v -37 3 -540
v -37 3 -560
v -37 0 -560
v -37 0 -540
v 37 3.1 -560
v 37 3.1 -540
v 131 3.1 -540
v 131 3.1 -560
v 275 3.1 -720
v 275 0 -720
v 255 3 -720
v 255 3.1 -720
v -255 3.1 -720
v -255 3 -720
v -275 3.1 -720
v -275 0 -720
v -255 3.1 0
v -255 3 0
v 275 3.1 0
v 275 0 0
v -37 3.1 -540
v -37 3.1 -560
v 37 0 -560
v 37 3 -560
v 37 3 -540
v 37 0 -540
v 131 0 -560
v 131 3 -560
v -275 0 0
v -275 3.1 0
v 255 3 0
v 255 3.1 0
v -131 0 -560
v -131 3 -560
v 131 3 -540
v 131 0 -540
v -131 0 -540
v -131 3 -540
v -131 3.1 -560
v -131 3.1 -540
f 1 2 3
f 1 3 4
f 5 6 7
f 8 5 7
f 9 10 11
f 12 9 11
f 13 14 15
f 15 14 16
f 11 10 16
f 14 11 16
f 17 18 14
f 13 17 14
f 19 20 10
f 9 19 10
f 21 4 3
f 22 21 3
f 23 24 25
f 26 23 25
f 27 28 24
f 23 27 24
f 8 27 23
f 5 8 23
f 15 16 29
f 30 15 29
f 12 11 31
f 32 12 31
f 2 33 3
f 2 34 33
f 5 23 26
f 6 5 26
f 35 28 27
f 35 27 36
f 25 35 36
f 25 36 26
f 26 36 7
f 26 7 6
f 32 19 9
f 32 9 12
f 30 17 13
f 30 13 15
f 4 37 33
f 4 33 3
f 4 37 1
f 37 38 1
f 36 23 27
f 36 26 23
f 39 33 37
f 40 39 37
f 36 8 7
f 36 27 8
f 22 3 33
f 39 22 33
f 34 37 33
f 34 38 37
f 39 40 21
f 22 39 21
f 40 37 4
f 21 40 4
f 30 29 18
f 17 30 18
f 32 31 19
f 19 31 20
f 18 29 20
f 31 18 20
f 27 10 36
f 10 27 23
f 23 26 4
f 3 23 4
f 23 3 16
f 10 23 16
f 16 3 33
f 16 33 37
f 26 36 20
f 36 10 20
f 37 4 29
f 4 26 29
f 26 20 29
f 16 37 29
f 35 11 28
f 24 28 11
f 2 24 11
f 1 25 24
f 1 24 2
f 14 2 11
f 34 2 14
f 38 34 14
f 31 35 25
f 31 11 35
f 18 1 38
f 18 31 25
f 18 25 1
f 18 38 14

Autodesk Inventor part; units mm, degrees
ref_plane "YZ Plane" through (0, 0, 0) normal (1, 0, 0) x (0, 1, 0)
ref_plane "XZ Plane" through (0, 0, 0) normal (0, 1, 0) x (-1, 0, 0)
ref_plane "XY Plane" through (0, 0, 0) normal (0, 0, 1) x (1, 0, 0)
sketch "Sketch1" plane through (0, 0, 0) normal (0, 1, 0) x (-1, 0, 0)
  line L0 (275, 0) -> (-275, 0)
  line L1 (-275, 0) -> (-275, -720)
  line L2 (-275, -720) -> (275, -720)
  line L3 (275, -720) -> (275, 0)
  line L4 (255, 0) -> (255, -720)
  line L5 (-255, -720) -> (-255, 0)
  point P0 (0, 0)
  point P1 (0, 0)
  dimension "d0" = 550
  dimension "d1" = 720
  dimension "d4" = 20
  dimension "d5" = 20
extrude "Extrusion1" add sketch "Sketch1" along normal blind 3
extrude "Extrusion2" add sketch "Sketch1" along normal blind 3.1 contours L3 L2 L4 L0 | L5 L2 L1 L0
sketch "Sketch2" plane through (0, 3, 0) normal (0, 1, 0) x (1, 0, 0)
  line L0 (-275, 0) -> (275, 0) projected
  line L1 (-275, 0) -> (-275, 550)
  line L2 (-275, 720) -> (-275, 0) projected
  line L3 (-275, 550) -> (-131, 550)
  line L4 (-131, 550) -> (-131, 540)
  line L5 (-131, 550) -> (-131, 560)
  line L6 (-131, 540) -> (-37, 540)
  line L7 (-131, 560) -> (-37, 560)
  line L8 (-37, 560) -> (-37, 540)
  line L9 (0, 0) -> (0, 720)
  line L10 (275, 550) -> (131, 550)
  line L11 (131, 550) -> (131, 540)
  line L12 (131, 550) -> (131, 560)
  line L13 (131, 540) -> (37, 540)
  line L14 (131, 560) -> (37, 560)
  line L15 (37, 560) -> (37, 540)
  dimension "d8" = 550
  dimension "d9" = 144
  dimension "d10" = 10
  dimension "d11" = 10
  dimension "d12" = 94
sketch "Sketch4" plane through (0, 0, 0) normal (0, -1, 0) x (1, 0, 0)
  line L0 (-131, -540) -> (-37, -540) projected
  line L1 (131, -540) -> (37, -540) projected
  line L2 (37, -560) -> (37, -540) projected
  line L3 (131, -560) -> (37, -560) projected
  line L4 (131, -560) -> (131, -540)
  line L5 (131, -560) -> (37, -560)
  line L6 (37, -540) -> (131, -540)
  line L7 (37, -540) -> (37, -560)
  line L8 (-37, -540) -> (-37, -560)
  line L9 (-37, -560) -> (-131, -560)
  line L10 (-131, -560) -> (-131, -540)
  line L11 (-37, -540) -> (-131, -540)
  point P0 (0, 0)
extrude "Extrusion5" cut sketch "Sketch2" against normal through all
extrude "Extrusion6" add sketch "Sketch4" against normal blind 3.1 separate body
equation "\"d0\" = track_width"
equation "\"d4\" = curb_width"
equation "\"d5\" = curb_width"
equation "\"d2\" = track_height"
equation "\"d6\" = track_height + curb_height"
equation "\"track_width\" = 550"
equation "\"curb_width\" = 20"
equation "\"track_height\" = 3"
equation "\"curb_height\" = 0.1"
properties part number "finish"
